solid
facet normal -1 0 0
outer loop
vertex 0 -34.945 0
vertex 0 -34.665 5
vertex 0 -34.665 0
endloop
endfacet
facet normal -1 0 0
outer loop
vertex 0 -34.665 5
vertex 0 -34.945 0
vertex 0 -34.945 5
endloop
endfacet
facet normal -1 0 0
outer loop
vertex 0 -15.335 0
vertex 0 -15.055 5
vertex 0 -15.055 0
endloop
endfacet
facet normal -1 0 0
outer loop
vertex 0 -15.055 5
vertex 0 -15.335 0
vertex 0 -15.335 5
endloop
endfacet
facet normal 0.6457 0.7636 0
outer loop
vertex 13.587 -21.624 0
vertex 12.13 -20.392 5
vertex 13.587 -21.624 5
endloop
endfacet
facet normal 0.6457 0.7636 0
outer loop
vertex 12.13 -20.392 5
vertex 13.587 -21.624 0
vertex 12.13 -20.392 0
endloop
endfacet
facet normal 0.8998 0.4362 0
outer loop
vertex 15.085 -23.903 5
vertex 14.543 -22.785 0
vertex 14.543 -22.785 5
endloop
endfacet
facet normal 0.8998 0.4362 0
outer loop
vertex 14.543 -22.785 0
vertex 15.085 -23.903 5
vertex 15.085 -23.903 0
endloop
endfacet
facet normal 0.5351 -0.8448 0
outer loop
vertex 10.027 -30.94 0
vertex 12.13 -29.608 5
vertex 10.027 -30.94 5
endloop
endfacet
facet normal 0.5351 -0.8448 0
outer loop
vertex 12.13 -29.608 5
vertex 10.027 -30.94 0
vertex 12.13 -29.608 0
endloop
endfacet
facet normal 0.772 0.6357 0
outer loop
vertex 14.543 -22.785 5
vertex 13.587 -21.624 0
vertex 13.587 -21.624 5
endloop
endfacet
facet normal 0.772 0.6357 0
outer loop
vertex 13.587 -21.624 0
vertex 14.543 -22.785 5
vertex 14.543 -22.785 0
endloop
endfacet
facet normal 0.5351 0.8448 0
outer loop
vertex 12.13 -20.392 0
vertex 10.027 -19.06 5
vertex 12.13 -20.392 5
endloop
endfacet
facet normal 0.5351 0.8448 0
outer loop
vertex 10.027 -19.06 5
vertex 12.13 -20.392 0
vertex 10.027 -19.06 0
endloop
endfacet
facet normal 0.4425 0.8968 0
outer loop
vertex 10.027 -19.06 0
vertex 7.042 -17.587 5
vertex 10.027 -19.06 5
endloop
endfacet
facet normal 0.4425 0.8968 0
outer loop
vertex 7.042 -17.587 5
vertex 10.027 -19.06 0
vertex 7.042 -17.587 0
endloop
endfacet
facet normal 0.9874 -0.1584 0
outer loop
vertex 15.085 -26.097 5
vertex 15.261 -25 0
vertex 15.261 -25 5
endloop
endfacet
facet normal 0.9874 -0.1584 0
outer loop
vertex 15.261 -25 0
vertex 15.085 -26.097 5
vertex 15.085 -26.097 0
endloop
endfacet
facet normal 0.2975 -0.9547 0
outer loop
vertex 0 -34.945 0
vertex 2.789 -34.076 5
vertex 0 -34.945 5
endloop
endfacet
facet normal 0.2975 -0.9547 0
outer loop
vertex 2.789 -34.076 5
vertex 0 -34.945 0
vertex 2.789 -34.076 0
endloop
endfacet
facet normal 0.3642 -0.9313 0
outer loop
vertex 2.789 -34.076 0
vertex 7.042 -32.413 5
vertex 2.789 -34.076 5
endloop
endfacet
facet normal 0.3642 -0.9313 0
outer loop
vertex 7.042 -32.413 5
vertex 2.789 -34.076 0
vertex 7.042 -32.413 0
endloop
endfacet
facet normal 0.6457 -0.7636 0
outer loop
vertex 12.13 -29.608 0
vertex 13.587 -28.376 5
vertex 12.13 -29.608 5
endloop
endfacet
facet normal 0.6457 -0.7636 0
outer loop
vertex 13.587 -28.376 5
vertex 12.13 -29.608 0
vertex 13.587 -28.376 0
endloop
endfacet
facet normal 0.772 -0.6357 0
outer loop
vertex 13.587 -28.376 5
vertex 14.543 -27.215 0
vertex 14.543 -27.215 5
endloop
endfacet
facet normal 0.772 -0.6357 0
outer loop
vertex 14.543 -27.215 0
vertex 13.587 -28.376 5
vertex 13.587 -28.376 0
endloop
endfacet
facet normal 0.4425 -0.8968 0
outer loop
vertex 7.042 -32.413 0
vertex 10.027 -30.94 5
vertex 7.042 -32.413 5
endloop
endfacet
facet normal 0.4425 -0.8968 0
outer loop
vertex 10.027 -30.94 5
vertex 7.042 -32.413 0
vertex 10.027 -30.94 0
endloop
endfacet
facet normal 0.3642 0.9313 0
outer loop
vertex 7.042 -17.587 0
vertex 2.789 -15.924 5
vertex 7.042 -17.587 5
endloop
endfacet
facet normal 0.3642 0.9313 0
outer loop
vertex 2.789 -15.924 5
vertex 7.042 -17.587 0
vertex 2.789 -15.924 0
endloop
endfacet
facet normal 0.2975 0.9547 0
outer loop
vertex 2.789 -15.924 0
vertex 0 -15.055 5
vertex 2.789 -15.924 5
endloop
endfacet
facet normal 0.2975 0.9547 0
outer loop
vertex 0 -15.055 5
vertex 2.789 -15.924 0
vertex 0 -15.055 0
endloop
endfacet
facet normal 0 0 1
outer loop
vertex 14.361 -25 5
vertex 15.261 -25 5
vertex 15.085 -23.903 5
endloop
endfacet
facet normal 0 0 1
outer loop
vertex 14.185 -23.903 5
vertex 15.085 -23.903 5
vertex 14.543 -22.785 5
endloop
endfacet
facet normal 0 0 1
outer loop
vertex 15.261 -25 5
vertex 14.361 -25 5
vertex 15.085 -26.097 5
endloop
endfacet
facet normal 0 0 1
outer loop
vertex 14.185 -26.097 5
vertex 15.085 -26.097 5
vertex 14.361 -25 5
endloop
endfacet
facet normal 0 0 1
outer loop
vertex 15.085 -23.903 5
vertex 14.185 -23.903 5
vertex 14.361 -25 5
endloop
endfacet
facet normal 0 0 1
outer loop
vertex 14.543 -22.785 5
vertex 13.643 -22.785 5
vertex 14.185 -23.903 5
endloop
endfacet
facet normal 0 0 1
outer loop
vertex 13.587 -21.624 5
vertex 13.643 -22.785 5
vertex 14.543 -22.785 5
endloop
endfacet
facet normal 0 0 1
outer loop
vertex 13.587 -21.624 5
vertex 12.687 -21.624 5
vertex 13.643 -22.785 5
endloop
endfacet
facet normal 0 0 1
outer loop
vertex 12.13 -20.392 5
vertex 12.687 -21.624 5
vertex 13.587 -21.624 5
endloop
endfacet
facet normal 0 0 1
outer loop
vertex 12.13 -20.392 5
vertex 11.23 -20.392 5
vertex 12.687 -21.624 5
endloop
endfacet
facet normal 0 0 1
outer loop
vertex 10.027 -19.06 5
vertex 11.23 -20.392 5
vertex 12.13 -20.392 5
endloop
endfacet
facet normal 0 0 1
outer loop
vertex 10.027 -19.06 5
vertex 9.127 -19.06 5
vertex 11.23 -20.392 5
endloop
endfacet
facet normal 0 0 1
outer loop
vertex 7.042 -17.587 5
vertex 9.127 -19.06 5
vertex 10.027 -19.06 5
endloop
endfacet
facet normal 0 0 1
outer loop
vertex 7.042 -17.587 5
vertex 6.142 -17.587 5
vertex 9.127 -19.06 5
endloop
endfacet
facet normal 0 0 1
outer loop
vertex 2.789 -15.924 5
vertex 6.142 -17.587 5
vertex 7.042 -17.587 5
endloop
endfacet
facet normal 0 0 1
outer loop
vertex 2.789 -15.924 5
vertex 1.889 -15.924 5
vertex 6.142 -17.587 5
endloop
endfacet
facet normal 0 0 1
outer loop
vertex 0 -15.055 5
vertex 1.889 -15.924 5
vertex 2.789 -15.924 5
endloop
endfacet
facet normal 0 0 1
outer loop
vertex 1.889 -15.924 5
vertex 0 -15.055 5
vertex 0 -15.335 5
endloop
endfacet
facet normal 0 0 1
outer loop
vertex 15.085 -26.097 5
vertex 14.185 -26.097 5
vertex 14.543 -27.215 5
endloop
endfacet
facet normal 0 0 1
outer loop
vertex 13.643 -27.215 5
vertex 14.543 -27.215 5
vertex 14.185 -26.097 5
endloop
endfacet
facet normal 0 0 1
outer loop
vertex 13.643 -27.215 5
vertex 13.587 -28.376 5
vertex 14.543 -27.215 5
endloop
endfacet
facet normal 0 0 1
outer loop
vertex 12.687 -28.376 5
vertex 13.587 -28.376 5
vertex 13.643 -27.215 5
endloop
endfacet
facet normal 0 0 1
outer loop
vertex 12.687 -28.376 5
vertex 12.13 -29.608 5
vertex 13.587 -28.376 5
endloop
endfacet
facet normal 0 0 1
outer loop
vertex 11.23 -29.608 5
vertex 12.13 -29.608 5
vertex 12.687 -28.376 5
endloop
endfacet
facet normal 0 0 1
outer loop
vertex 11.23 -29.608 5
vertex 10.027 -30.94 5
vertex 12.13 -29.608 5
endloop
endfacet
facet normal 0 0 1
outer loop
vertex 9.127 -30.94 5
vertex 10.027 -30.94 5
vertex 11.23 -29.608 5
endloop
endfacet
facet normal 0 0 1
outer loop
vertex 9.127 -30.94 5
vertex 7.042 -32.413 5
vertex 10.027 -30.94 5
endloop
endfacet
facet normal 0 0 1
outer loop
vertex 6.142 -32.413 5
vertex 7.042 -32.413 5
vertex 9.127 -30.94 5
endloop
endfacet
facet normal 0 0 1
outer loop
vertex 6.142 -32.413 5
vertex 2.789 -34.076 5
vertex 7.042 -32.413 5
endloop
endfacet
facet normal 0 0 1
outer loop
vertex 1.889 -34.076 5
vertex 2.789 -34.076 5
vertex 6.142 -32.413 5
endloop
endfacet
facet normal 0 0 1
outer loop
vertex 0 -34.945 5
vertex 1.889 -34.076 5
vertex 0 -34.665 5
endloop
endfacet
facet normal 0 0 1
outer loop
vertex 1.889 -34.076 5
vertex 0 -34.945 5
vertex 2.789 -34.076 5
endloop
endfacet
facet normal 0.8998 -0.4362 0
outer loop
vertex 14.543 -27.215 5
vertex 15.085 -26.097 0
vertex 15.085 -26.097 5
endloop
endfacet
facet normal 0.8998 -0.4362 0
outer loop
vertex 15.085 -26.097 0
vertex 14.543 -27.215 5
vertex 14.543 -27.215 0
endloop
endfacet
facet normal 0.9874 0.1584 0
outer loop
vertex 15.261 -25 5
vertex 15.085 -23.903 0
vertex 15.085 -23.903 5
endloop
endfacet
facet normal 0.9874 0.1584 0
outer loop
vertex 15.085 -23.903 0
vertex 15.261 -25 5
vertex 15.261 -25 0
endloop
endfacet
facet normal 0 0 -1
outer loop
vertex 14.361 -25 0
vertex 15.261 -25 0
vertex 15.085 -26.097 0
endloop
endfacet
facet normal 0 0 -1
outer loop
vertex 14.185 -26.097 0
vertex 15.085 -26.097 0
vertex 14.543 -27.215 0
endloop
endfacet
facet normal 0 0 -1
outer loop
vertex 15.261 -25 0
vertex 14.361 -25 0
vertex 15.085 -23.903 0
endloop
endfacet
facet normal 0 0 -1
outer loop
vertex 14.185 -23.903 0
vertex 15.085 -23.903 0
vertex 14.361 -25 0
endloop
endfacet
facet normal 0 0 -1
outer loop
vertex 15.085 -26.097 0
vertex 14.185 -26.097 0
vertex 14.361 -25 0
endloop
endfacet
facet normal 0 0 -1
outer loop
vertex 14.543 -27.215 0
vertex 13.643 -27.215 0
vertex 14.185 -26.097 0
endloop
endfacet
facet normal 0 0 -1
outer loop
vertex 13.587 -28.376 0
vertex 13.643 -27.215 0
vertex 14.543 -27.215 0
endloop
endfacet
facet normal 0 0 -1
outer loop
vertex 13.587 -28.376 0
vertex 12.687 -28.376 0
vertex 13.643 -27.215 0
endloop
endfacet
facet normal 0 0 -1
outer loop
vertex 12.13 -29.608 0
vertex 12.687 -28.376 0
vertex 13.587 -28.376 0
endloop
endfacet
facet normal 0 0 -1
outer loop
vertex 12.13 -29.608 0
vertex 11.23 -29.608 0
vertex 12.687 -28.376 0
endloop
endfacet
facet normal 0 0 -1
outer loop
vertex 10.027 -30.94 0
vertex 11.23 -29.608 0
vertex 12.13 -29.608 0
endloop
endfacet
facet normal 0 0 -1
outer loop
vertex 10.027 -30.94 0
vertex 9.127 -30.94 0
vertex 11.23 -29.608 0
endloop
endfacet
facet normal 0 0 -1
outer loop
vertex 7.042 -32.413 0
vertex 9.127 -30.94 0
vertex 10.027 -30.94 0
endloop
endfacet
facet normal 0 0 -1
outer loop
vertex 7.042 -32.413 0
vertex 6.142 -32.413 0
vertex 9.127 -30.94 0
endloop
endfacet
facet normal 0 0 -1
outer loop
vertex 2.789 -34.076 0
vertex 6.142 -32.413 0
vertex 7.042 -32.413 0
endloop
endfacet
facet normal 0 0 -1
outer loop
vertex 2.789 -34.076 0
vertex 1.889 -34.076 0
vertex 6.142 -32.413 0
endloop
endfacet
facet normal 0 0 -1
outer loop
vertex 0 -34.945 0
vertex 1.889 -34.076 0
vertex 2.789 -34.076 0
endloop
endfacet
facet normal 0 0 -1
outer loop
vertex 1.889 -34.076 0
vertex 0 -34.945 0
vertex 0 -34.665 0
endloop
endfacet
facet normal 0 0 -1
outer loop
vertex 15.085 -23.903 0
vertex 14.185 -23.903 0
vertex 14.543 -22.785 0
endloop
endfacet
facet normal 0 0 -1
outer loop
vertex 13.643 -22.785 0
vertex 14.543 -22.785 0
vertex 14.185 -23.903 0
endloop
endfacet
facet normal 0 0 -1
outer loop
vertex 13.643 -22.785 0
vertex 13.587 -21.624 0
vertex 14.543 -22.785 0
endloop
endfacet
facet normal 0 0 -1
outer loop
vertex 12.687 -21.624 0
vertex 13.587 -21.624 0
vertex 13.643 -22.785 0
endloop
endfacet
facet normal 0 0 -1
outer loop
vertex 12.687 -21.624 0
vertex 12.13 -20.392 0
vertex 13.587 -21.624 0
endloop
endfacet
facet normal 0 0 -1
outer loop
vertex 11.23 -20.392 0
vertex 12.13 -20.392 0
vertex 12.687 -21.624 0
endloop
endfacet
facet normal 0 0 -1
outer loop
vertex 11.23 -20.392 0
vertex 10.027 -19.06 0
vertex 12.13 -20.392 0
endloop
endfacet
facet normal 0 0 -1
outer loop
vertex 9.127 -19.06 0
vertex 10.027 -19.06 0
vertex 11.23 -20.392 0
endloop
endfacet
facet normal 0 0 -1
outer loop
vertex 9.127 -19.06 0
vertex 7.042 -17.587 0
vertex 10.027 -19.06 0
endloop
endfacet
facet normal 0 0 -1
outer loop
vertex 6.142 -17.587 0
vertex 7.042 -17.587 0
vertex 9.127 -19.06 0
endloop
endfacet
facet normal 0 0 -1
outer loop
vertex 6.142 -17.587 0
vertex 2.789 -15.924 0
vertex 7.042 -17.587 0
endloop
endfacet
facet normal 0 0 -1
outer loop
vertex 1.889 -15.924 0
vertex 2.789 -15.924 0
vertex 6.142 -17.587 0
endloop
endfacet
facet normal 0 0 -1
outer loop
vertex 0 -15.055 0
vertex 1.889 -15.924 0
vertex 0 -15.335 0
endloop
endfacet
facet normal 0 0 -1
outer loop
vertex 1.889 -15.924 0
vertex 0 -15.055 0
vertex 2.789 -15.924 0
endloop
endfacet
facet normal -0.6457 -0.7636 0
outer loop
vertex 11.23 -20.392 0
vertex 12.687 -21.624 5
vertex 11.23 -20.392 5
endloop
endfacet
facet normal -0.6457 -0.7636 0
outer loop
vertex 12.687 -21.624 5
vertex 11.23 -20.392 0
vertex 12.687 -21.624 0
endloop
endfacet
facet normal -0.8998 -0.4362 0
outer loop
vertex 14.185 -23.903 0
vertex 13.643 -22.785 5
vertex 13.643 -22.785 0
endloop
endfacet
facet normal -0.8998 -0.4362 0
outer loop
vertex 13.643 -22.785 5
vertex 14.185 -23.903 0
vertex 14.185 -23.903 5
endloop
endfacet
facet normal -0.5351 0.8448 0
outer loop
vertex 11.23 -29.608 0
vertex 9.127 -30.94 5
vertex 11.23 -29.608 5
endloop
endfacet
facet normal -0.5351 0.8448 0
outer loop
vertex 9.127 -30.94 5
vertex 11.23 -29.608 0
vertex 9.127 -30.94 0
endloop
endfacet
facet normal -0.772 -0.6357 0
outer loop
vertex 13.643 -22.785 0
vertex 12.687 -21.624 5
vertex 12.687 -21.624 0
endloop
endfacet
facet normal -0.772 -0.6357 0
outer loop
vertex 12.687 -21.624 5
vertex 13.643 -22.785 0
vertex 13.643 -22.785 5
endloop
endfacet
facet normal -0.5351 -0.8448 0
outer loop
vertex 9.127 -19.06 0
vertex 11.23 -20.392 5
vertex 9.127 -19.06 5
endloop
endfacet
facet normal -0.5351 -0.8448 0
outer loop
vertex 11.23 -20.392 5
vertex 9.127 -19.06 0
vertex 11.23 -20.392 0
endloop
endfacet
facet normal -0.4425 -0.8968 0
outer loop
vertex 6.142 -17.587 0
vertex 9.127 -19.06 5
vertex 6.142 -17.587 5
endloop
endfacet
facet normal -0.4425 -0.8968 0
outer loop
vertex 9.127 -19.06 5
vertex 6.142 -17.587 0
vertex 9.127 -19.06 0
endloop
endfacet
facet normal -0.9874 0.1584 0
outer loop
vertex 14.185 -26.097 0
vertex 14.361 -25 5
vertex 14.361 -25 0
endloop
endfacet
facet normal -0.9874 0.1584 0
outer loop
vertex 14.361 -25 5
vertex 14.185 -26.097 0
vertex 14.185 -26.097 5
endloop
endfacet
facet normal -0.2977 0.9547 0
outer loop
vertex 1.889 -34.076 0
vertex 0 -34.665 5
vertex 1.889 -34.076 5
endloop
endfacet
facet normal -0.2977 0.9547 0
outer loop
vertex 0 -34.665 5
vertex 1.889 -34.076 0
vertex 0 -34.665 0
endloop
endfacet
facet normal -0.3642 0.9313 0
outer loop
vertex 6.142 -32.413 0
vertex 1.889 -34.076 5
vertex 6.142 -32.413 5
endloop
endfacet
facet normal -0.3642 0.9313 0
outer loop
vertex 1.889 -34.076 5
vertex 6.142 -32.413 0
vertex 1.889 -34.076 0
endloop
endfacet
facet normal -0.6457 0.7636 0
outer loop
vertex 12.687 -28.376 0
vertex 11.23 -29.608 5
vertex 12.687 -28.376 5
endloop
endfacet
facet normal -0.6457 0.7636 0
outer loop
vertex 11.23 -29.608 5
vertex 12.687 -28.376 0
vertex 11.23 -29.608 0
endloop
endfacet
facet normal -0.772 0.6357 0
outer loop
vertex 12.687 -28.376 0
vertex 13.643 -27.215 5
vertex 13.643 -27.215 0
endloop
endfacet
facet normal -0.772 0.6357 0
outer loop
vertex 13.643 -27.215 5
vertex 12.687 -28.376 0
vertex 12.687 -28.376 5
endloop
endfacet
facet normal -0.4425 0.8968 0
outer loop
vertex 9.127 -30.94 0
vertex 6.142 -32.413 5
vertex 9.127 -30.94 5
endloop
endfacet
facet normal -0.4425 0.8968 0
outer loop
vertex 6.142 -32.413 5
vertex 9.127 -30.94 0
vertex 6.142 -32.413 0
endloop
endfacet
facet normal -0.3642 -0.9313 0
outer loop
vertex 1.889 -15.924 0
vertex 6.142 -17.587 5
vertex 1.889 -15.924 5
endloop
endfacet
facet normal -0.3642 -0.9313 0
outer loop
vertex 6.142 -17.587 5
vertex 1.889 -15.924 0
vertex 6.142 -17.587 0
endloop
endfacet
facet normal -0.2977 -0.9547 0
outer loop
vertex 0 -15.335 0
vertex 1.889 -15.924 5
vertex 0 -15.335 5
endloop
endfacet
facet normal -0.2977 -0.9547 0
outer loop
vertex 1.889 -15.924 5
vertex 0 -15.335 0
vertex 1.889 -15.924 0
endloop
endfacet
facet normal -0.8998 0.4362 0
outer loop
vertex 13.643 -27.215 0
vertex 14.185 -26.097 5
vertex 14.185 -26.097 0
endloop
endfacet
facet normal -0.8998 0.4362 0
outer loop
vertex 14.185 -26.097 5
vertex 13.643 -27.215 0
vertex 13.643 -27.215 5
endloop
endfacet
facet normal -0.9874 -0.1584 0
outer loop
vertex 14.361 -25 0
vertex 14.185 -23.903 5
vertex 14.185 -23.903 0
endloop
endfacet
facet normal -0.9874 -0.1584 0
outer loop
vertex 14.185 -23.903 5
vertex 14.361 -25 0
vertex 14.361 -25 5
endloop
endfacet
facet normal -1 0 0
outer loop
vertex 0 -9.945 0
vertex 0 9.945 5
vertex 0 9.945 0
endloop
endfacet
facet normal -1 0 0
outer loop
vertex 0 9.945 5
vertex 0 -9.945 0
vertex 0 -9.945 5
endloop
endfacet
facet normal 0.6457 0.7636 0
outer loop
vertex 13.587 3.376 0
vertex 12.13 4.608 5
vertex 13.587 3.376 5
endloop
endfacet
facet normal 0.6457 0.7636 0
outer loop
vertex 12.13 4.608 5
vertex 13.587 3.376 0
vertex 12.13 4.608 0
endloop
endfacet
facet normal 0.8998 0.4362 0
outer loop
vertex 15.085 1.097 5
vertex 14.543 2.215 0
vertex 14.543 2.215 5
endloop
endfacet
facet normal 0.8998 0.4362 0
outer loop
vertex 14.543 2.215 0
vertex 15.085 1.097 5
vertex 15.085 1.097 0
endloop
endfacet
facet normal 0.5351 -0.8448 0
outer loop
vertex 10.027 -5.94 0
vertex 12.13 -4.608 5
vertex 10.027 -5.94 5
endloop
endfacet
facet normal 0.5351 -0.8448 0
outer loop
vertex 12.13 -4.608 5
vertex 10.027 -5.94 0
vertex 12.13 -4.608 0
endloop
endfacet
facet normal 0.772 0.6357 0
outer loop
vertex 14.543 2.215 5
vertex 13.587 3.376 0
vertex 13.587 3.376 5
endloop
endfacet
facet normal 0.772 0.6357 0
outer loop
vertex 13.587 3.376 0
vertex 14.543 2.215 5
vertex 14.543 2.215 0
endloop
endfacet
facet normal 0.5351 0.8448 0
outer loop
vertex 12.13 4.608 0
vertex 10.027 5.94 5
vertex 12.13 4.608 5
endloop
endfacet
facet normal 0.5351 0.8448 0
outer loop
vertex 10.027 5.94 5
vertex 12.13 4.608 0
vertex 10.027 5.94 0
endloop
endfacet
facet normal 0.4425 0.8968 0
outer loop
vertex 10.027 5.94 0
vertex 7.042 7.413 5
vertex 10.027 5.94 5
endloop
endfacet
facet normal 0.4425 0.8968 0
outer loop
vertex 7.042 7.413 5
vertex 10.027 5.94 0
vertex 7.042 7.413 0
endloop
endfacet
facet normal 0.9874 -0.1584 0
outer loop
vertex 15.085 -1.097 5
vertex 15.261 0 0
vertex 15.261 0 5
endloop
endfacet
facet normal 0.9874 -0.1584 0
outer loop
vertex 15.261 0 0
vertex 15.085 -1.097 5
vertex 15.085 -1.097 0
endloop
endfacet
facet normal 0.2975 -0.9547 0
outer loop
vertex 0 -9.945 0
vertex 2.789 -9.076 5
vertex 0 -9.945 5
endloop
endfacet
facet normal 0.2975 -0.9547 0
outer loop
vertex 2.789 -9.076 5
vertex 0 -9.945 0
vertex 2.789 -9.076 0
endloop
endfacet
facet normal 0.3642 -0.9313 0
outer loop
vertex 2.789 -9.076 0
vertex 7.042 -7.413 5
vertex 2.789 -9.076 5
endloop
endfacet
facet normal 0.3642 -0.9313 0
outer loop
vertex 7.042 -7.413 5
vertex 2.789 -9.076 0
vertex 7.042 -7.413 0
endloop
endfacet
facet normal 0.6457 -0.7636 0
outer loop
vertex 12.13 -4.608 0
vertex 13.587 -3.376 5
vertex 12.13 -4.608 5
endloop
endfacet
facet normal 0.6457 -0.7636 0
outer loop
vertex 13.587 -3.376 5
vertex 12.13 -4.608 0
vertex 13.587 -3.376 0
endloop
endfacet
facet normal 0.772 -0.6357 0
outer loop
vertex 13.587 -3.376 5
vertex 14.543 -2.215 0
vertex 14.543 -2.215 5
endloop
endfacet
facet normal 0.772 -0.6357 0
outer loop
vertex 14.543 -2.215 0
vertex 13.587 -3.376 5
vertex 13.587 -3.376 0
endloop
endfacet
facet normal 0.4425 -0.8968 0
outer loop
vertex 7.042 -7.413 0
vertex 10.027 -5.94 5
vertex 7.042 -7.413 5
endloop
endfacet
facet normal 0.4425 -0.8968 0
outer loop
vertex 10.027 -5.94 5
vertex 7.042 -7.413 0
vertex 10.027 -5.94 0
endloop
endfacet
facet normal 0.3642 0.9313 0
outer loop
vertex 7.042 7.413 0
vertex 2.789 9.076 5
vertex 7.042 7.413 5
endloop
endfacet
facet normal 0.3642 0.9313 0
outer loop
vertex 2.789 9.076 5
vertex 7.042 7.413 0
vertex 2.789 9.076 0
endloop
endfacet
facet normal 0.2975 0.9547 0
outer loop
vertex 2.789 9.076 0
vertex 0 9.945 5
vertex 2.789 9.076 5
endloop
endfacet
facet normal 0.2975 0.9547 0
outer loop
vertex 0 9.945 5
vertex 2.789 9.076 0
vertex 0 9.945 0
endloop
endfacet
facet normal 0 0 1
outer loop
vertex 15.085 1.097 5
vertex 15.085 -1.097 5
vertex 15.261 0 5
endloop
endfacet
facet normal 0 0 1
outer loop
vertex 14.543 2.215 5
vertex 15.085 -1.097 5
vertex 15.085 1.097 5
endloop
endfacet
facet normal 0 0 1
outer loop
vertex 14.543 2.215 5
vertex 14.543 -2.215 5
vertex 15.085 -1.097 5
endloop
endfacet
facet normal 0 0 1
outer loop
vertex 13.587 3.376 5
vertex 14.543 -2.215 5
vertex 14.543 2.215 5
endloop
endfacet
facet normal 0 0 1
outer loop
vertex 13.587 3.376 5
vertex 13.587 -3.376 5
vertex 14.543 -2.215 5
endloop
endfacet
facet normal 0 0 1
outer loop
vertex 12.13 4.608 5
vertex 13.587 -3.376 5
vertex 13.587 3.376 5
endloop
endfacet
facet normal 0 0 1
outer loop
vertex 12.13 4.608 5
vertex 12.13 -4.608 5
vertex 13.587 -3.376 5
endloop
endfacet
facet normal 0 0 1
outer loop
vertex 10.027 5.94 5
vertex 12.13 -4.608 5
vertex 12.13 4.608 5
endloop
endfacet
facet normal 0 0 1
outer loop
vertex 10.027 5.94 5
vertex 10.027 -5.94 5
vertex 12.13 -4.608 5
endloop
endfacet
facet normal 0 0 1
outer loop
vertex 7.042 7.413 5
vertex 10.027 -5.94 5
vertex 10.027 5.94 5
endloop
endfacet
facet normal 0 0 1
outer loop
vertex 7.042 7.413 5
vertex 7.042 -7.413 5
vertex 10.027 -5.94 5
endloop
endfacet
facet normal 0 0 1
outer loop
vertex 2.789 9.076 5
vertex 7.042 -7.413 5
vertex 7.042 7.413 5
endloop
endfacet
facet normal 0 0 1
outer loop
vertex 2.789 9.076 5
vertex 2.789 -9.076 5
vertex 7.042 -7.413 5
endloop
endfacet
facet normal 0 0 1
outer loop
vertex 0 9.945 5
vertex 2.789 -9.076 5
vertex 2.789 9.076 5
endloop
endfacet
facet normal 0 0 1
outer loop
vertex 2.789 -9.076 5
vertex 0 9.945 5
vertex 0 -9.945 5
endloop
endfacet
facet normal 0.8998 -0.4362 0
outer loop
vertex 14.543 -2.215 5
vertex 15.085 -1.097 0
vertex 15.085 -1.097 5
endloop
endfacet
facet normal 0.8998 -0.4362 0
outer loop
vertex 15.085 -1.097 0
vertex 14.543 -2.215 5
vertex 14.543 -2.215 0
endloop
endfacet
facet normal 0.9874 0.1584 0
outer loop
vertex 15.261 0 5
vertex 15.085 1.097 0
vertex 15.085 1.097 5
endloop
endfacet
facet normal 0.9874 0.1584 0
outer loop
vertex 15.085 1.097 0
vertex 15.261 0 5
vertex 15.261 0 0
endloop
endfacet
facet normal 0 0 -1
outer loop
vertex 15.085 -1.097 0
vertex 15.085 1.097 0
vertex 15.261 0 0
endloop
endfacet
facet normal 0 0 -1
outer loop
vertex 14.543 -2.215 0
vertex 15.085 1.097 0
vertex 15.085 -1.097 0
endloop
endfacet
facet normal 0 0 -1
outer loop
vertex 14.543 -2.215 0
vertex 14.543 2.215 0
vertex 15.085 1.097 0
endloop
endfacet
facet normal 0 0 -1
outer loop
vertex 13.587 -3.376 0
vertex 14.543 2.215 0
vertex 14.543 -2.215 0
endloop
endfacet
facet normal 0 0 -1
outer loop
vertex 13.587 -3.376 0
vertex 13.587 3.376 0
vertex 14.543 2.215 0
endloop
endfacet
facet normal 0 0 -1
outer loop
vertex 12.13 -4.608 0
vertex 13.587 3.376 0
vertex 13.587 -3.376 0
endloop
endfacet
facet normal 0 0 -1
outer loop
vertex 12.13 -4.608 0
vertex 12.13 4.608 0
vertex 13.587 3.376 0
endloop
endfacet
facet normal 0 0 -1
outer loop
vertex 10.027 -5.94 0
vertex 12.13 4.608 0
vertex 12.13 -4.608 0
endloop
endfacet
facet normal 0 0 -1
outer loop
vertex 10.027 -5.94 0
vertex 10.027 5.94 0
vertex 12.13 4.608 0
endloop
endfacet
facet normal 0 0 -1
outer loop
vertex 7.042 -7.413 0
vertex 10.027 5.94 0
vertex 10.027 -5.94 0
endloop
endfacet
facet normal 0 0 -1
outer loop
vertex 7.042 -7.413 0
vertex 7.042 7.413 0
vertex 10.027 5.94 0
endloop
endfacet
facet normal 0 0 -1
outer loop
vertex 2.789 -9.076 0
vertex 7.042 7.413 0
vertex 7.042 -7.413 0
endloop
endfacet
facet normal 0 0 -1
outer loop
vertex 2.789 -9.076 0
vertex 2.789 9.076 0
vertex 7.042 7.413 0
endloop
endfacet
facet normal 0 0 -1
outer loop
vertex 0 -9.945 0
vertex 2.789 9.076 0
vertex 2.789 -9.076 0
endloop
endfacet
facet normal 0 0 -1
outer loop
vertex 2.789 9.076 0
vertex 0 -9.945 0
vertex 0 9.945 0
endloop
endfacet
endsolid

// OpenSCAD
// file: ../parabola.scad
// This was inspired by the post found here:
//	http://forum.openscad.org/Parabolic-tube-tp28894p28897.html

module parabolaProjection(d1=20, h = 30)
{
//    projection(cut=false)
    projection(cut=true)
        rotate([0, 70, 0])
            cylinder(d1=d1, d2=0, h = h);
}

module parabola(d1=20, zExtrude = 50, h = 30)
{
//    linear_extrude(zExtrude)
    difference()
    {
        linear_extrude(zExtrude)
        parabolaProjection(d1=d1, h = h);

        translate([-0.9, 0, -1.0])
        linear_extrude(zExtrude + 2)
        parabolaProjection(d1=d1, h = h);

    //           parabolaProjection();
    }
}
// main file
use <../parabola.scad>

zExtrude = 5;

linear_extrude(zExtrude)
parabolaProjection();

translate([0, -25,0])
parabola(zExtrude = 5);
